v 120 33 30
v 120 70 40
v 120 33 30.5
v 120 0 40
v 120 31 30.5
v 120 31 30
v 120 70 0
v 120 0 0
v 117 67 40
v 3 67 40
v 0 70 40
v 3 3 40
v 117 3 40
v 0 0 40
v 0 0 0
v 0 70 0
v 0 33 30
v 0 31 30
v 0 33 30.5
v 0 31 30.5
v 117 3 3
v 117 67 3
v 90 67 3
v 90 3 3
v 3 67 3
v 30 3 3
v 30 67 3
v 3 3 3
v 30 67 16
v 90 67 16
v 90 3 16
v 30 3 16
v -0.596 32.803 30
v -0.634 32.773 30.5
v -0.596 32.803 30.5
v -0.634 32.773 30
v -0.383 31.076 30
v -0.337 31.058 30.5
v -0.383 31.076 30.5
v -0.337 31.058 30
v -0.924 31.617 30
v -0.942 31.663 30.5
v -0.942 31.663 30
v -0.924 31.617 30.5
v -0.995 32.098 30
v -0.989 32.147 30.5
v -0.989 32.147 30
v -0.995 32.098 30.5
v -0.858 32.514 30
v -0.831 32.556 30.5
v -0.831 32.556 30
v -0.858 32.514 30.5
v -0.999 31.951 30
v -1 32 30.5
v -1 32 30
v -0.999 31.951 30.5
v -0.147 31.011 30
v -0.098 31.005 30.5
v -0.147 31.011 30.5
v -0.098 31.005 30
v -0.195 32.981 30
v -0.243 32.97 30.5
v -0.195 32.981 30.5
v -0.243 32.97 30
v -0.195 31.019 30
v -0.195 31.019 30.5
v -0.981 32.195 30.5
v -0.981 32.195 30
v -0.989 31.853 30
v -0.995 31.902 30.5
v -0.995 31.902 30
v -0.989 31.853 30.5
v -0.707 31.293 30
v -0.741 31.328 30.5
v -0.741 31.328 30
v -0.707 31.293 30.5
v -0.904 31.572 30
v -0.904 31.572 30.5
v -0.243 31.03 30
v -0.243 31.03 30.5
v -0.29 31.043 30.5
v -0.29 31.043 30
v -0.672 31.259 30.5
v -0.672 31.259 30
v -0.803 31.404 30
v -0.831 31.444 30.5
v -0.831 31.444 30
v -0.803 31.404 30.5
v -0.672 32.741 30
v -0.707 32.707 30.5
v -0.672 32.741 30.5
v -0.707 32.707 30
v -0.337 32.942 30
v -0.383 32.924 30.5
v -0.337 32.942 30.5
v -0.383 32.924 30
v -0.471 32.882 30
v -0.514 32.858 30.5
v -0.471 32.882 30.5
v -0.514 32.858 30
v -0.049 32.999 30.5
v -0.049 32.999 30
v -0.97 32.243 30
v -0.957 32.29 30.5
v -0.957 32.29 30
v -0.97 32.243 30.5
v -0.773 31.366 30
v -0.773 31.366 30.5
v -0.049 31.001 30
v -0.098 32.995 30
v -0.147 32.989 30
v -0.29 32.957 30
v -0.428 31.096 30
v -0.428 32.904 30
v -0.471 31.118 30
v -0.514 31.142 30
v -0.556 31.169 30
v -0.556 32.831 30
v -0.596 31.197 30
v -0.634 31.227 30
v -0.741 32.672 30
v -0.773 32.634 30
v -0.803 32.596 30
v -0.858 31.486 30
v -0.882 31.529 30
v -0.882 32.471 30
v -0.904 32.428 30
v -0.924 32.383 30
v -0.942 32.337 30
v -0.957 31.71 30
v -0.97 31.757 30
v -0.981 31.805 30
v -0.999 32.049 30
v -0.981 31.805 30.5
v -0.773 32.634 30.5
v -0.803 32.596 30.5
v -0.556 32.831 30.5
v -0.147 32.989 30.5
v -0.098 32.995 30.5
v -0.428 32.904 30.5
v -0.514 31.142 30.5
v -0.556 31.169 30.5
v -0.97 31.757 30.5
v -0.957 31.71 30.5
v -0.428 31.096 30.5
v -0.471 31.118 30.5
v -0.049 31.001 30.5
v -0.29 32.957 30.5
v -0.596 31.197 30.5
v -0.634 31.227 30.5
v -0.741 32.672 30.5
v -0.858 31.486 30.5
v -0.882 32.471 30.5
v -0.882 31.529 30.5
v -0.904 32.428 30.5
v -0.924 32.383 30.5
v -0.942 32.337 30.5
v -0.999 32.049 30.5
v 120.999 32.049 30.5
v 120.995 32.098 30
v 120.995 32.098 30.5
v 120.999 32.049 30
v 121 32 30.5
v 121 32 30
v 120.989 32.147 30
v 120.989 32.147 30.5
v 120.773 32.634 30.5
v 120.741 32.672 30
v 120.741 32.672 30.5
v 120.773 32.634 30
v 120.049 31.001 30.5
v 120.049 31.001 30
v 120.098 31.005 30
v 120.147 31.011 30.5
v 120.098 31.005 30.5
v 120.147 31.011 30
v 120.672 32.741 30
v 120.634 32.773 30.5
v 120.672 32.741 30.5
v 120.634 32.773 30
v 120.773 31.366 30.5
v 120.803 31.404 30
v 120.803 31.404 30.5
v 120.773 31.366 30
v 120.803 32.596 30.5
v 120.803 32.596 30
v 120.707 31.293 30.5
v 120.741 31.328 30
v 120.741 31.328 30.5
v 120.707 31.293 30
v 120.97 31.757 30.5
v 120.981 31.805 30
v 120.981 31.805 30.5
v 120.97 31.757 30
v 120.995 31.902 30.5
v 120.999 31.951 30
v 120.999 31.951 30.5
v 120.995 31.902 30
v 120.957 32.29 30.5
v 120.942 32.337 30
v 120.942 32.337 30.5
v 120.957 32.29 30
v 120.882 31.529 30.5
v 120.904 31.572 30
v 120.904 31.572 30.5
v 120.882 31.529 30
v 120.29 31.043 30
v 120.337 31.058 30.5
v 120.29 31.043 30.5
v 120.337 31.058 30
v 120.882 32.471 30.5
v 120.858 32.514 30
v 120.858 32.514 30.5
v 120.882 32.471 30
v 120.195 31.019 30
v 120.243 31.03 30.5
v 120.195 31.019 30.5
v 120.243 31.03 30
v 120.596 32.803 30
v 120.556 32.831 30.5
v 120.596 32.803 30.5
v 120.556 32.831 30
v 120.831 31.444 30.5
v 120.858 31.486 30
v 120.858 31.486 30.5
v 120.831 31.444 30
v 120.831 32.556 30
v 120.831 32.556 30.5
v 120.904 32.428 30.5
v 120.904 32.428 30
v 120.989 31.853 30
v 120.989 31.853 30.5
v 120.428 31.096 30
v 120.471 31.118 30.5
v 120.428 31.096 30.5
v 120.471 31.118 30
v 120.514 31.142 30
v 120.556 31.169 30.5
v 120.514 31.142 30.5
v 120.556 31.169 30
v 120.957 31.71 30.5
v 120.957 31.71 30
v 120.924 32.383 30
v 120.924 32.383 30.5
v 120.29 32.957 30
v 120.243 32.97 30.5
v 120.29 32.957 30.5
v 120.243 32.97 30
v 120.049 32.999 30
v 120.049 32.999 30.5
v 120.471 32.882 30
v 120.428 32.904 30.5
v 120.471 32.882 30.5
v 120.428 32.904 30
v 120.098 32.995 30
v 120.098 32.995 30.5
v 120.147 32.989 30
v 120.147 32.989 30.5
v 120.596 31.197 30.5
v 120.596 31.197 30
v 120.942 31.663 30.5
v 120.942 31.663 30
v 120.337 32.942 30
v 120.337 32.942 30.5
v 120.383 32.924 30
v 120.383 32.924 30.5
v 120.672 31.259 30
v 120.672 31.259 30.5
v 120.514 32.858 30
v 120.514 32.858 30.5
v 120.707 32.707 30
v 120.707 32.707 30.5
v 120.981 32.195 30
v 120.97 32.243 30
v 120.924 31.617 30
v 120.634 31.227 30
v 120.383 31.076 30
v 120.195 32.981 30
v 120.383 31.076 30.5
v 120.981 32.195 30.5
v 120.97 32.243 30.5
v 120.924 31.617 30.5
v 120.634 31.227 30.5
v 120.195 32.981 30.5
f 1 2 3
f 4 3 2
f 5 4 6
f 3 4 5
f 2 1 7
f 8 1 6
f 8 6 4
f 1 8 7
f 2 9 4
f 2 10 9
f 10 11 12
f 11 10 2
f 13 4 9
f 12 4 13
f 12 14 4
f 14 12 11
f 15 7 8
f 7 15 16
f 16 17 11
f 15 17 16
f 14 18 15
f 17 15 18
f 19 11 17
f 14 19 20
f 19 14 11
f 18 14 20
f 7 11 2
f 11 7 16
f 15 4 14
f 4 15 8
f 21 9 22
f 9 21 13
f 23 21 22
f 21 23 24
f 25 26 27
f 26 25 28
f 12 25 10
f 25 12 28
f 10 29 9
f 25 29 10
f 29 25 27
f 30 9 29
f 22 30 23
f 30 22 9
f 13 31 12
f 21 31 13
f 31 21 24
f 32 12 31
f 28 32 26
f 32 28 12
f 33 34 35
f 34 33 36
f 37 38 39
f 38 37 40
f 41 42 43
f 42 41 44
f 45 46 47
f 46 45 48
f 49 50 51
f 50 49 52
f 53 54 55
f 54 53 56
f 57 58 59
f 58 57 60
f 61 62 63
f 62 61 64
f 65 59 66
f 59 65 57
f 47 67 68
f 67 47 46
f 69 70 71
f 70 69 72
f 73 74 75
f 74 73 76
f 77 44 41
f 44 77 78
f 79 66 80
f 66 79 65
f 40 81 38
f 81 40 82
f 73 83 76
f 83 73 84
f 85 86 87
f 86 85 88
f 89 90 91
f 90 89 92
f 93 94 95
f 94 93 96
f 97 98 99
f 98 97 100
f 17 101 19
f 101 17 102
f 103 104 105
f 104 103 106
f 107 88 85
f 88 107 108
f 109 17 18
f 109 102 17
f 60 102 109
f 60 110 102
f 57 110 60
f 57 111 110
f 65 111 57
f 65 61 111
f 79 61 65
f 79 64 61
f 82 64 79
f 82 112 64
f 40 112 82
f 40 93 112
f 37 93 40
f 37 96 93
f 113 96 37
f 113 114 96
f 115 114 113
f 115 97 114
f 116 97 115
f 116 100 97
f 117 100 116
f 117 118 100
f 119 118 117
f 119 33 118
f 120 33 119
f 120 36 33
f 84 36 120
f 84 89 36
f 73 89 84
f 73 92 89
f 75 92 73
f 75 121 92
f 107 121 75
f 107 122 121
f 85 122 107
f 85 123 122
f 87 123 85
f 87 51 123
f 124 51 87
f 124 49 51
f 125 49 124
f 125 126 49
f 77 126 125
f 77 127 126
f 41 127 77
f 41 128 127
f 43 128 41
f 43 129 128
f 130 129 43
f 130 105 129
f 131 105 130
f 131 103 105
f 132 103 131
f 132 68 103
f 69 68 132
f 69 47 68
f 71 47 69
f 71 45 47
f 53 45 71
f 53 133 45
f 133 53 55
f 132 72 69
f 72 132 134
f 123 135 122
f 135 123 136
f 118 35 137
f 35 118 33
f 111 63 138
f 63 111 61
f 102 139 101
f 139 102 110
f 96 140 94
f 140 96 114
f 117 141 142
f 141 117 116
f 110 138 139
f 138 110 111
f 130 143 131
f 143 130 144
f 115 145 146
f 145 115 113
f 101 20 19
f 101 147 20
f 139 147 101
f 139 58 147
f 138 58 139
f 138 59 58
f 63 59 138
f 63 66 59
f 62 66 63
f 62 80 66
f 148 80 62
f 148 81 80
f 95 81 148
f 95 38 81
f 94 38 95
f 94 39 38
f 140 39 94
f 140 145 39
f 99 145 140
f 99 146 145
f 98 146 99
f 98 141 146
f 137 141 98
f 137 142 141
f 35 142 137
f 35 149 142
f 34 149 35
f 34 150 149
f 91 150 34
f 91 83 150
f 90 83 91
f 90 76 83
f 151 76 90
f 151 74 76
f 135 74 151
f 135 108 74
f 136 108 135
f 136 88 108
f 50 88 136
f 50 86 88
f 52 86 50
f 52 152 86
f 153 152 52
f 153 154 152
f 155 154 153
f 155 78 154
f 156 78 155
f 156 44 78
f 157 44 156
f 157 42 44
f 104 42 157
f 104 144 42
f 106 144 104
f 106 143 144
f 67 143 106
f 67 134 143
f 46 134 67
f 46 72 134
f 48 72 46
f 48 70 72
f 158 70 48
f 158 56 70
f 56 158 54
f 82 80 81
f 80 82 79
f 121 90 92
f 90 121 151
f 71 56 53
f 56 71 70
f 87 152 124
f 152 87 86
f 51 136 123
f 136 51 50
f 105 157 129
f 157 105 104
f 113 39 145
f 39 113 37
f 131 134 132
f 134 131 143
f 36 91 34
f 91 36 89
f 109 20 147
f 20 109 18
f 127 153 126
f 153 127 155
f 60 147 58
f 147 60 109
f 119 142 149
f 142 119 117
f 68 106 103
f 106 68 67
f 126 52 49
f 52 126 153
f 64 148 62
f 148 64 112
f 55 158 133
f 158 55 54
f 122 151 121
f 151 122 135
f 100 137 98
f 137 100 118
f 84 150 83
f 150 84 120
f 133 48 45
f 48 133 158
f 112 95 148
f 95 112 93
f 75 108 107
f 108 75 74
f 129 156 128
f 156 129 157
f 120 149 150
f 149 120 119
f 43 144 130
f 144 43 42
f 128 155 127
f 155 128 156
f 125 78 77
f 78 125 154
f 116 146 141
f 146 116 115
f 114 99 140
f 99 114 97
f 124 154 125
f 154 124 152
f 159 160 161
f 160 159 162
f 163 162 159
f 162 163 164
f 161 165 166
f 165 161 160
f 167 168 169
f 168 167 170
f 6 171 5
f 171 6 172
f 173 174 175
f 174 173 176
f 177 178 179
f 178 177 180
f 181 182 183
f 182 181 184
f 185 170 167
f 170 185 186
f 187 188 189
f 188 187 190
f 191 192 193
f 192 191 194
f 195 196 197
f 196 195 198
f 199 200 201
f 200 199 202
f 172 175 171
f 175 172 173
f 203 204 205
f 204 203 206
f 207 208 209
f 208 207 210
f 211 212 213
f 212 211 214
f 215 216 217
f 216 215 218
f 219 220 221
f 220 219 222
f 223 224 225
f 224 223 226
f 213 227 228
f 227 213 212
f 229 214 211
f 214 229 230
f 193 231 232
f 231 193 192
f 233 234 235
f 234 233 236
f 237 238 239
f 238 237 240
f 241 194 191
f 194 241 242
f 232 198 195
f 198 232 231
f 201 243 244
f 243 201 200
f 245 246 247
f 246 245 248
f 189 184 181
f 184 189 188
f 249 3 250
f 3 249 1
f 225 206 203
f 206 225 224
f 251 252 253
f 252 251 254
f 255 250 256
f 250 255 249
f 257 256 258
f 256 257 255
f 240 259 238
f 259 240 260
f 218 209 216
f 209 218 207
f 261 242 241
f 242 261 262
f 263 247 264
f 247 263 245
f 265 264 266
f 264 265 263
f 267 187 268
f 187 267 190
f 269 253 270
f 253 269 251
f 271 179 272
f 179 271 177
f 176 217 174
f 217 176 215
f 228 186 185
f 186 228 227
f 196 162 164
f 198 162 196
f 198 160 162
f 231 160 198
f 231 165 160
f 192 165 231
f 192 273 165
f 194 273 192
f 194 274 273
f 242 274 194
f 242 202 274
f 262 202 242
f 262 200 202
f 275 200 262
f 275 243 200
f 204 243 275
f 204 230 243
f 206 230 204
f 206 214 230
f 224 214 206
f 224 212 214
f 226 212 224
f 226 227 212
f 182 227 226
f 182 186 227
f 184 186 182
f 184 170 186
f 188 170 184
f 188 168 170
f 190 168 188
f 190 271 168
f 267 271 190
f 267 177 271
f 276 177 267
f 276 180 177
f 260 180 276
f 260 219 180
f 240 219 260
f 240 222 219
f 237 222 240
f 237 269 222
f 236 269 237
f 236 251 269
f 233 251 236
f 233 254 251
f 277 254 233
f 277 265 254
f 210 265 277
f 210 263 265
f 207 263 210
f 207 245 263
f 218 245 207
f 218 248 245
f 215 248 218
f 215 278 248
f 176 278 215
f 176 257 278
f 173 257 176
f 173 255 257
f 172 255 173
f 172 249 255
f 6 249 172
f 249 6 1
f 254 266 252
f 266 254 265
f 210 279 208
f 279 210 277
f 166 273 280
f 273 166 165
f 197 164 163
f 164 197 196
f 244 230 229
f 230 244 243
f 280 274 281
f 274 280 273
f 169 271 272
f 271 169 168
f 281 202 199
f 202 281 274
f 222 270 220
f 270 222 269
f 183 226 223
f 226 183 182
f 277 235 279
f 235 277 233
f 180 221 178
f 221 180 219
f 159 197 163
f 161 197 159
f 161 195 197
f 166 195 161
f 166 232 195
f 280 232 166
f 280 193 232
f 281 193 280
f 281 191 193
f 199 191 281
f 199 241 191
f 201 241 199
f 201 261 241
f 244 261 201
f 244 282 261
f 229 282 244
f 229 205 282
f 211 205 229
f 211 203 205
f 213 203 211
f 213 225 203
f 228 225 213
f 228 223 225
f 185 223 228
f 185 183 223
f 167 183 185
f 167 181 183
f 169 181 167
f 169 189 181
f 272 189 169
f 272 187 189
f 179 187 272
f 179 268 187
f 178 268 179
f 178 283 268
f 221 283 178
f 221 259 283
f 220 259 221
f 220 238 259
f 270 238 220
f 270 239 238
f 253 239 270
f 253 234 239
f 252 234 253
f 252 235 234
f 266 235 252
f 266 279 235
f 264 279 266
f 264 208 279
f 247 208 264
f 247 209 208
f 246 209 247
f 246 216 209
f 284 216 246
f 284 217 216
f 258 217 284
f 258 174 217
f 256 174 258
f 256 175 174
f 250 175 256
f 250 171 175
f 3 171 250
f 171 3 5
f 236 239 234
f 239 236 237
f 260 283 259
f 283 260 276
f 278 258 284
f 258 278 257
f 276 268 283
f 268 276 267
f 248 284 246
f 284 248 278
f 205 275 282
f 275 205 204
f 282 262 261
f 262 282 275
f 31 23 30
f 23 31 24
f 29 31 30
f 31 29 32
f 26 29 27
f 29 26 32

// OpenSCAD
// Buffer Tank for Mini Horizontal Gel Electrophoresis
// Units: millimetres

// Outer Dimensions
$outer_x = 120;
$outer_y = 70;
$outer_z = 40;

// Wall and Floor Thickness
$wall_thickness = 3;
$floor_thickness = 3;

// Platform Dimensions
$platform_length = 60; // X dimension
$platform_width = $outer_y - (2 * $wall_thickness); // Spans full inner width
$platform_height = 10; // Height above inner floor
$platform_top_z = $floor_thickness + $platform_height; // Absolute Z of top surface

// Hole Dimensions
$hole_diameter = 2;
$hole_y = ($outer_y / 2) - ($wall_thickness); // Centered in Y relative to inner wall
$hole_z = 30; // Absolute Z position
$hole_extension = 0.5; // Extension past face for clean cutting

// Configuration
$fn = 128; // High resolution for smooth curves

// Calculate Inner Dimensions
$inner_x = $outer_x - (2 * $wall_thickness);
$inner_y = $outer_y - (2 * $wall_thickness);
$inner_z = $outer_z - $floor_thickness;

// Main Tank Body
// Constructed as a hollow box with a floor
difference() {
    // Outer Block
    cube([
        $outer_x, 
        $outer_y, 
        $outer_z
    ]);
    
    // Inner Void (Hollow space)
    // The void starts at z = $floor_thickness
    translate([
        $wall_thickness, 
        $wall_thickness, 
        $floor_thickness
    ]) {
        cube([
            $inner_x, 
            $inner_y, 
            $inner_z
        ]);
    }
}

// Raised Platform
// Positioned in the middle of the tank, spanning full inner width
translate([
    ($outer_x / 2) - ($platform_length / 2), 
    $wall_thickness, // Aligned with inner wall start
    $floor_thickness
]) {
    // Platform Base (extends through the void to the floor)
    cube([
        $platform_length, 
        $platform_width, 
        $platform_height + $floor_thickness
    ]);
}

// Electrode Holes
// Two holes, one at each end (X = 0 and X = $outer_x)
// Located at y = $hole_y, z = $hole_z
// Drilled horizontally along X axis

for (x_offset = [0, $outer_x]) {
    translate([
        x_offset, 
        $hole_y, 
        $hole_z
    ]) {
        // Cylinder for the hole
        // Extend slightly past the face to ensure clean cut
        cylinder(
            h = $hole_extension, 
            r = $hole_diameter / 2,
            $fn = $fn
        );
    }
}
